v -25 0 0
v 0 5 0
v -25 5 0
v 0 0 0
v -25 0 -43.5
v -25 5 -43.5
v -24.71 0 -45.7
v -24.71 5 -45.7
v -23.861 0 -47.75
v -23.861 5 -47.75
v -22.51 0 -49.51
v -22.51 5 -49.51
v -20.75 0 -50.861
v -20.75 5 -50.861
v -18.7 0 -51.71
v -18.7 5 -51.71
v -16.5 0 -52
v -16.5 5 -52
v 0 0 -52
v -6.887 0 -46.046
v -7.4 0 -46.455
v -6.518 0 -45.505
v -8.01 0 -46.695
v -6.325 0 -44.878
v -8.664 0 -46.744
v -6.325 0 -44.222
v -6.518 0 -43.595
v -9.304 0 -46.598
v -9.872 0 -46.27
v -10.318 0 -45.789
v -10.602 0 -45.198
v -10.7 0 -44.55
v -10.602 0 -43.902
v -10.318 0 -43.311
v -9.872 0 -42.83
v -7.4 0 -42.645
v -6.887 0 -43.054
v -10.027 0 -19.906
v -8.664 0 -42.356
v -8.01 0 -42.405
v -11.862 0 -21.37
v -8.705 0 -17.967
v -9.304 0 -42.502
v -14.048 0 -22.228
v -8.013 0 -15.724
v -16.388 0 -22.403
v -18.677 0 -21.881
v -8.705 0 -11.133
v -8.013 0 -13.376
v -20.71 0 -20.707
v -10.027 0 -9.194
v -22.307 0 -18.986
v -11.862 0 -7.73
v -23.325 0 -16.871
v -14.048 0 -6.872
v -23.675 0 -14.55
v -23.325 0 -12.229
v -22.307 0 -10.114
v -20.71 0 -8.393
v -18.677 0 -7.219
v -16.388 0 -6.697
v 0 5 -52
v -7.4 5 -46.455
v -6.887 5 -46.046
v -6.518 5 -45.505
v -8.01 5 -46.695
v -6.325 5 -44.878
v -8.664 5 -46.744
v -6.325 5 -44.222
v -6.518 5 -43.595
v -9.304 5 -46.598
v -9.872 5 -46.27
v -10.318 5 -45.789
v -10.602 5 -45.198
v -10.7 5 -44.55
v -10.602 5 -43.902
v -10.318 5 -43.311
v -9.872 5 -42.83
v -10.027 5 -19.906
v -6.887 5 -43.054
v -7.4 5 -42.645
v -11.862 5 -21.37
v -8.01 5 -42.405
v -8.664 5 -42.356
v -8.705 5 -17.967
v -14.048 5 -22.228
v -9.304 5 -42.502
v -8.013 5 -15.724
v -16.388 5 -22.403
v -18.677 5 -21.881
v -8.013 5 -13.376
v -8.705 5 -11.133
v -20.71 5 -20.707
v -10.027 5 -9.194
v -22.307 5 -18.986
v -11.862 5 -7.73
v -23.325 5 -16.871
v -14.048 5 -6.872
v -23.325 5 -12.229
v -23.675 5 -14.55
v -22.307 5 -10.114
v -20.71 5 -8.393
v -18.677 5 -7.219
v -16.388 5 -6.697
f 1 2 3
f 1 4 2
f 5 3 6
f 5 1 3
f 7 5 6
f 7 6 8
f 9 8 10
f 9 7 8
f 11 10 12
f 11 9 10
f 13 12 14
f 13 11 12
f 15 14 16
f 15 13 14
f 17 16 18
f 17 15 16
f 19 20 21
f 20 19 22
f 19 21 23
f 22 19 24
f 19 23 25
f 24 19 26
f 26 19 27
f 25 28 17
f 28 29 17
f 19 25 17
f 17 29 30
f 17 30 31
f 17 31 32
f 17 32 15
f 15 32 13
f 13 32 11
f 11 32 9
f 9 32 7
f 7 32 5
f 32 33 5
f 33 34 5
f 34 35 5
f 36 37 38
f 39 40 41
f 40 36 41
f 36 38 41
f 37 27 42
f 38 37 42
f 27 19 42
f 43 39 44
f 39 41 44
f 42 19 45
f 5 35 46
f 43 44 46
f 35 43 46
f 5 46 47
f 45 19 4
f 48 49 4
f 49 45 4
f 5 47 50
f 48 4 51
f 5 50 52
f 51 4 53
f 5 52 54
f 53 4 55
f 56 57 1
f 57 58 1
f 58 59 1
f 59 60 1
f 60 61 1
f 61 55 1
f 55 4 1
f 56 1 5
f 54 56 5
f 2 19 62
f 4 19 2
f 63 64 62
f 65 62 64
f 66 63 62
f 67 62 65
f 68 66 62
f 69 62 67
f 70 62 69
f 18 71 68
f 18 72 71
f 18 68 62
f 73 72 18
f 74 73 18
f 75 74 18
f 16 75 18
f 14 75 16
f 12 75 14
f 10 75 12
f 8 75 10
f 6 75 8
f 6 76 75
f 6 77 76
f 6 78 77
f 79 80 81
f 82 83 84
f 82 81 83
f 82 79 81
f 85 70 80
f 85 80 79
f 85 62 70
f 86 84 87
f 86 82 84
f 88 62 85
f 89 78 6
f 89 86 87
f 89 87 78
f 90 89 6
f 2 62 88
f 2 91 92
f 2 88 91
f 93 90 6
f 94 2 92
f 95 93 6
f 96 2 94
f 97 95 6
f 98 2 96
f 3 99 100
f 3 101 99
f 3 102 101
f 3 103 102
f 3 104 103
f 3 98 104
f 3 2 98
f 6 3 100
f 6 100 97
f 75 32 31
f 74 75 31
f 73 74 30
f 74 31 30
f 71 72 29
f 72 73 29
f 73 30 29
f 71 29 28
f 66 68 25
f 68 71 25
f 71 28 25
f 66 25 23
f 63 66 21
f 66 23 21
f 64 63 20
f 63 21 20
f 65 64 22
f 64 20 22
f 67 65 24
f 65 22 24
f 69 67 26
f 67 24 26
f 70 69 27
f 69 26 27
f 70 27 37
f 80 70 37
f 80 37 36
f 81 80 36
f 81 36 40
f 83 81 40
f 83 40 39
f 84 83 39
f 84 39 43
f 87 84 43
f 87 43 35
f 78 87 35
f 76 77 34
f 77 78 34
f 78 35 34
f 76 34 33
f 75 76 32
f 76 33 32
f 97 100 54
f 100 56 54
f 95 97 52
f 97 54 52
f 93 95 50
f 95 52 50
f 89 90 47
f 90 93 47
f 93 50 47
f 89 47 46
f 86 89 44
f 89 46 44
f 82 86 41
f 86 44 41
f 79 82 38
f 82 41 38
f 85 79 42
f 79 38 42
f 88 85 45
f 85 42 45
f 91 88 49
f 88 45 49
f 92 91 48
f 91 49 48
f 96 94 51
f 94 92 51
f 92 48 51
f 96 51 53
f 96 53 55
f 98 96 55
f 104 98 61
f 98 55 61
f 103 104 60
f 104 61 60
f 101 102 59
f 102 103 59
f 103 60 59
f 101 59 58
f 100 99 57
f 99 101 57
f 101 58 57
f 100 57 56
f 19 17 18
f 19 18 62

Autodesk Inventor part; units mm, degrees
ref_plane "YZ Plane" through (0, 0, 0) normal (1, 0, 0) x (0, 1, 0)
ref_plane "XZ Plane" through (0, 0, 0) normal (0, 1, 0) x (-1, 0, 0)
ref_plane "XY Plane" through (0, 0, 0) normal (0, 0, 1) x (1, 0, 0)
sketch "Sketch1" plane through (0, 0, 0) normal (0, 1, 0) x (-1, 0, 0)
  line L0 (0, 0) -> (25, 0)
  line L1 (25, 0) -> (25, -43.5)
  line L2 (16.5, -52) -> (0, -52)
  line L3 (0, -52) -> (0, 0)
  arc A0 (16.5, -52) -> (25, -43.5) centre (16.5, -43.5) ccw
  circle A1 centre (15.8, -14.55) radius 7.875
  circle A2 centre (8.5, -44.55) radius 2.2
  line L4 (5, 10.2052) -> (5, -72.053) construction
  point P0 (25, -52)
  dimension "d0" = 25
  dimension "d1" = 52
  dimension "d2" = 8.5
  dimension "d3" = 15.75
  dimension "d4" = 4.4
  dimension "d5" = 16.5
  dimension "d6" = 7.45
  dimension "d7" = 20
  dimension "d8" = 9.2
  dimension "d9" = 30
extrude "Extrusion1" add sketch "Sketch1" along normal blind 5
properties part number "corner spacers"
